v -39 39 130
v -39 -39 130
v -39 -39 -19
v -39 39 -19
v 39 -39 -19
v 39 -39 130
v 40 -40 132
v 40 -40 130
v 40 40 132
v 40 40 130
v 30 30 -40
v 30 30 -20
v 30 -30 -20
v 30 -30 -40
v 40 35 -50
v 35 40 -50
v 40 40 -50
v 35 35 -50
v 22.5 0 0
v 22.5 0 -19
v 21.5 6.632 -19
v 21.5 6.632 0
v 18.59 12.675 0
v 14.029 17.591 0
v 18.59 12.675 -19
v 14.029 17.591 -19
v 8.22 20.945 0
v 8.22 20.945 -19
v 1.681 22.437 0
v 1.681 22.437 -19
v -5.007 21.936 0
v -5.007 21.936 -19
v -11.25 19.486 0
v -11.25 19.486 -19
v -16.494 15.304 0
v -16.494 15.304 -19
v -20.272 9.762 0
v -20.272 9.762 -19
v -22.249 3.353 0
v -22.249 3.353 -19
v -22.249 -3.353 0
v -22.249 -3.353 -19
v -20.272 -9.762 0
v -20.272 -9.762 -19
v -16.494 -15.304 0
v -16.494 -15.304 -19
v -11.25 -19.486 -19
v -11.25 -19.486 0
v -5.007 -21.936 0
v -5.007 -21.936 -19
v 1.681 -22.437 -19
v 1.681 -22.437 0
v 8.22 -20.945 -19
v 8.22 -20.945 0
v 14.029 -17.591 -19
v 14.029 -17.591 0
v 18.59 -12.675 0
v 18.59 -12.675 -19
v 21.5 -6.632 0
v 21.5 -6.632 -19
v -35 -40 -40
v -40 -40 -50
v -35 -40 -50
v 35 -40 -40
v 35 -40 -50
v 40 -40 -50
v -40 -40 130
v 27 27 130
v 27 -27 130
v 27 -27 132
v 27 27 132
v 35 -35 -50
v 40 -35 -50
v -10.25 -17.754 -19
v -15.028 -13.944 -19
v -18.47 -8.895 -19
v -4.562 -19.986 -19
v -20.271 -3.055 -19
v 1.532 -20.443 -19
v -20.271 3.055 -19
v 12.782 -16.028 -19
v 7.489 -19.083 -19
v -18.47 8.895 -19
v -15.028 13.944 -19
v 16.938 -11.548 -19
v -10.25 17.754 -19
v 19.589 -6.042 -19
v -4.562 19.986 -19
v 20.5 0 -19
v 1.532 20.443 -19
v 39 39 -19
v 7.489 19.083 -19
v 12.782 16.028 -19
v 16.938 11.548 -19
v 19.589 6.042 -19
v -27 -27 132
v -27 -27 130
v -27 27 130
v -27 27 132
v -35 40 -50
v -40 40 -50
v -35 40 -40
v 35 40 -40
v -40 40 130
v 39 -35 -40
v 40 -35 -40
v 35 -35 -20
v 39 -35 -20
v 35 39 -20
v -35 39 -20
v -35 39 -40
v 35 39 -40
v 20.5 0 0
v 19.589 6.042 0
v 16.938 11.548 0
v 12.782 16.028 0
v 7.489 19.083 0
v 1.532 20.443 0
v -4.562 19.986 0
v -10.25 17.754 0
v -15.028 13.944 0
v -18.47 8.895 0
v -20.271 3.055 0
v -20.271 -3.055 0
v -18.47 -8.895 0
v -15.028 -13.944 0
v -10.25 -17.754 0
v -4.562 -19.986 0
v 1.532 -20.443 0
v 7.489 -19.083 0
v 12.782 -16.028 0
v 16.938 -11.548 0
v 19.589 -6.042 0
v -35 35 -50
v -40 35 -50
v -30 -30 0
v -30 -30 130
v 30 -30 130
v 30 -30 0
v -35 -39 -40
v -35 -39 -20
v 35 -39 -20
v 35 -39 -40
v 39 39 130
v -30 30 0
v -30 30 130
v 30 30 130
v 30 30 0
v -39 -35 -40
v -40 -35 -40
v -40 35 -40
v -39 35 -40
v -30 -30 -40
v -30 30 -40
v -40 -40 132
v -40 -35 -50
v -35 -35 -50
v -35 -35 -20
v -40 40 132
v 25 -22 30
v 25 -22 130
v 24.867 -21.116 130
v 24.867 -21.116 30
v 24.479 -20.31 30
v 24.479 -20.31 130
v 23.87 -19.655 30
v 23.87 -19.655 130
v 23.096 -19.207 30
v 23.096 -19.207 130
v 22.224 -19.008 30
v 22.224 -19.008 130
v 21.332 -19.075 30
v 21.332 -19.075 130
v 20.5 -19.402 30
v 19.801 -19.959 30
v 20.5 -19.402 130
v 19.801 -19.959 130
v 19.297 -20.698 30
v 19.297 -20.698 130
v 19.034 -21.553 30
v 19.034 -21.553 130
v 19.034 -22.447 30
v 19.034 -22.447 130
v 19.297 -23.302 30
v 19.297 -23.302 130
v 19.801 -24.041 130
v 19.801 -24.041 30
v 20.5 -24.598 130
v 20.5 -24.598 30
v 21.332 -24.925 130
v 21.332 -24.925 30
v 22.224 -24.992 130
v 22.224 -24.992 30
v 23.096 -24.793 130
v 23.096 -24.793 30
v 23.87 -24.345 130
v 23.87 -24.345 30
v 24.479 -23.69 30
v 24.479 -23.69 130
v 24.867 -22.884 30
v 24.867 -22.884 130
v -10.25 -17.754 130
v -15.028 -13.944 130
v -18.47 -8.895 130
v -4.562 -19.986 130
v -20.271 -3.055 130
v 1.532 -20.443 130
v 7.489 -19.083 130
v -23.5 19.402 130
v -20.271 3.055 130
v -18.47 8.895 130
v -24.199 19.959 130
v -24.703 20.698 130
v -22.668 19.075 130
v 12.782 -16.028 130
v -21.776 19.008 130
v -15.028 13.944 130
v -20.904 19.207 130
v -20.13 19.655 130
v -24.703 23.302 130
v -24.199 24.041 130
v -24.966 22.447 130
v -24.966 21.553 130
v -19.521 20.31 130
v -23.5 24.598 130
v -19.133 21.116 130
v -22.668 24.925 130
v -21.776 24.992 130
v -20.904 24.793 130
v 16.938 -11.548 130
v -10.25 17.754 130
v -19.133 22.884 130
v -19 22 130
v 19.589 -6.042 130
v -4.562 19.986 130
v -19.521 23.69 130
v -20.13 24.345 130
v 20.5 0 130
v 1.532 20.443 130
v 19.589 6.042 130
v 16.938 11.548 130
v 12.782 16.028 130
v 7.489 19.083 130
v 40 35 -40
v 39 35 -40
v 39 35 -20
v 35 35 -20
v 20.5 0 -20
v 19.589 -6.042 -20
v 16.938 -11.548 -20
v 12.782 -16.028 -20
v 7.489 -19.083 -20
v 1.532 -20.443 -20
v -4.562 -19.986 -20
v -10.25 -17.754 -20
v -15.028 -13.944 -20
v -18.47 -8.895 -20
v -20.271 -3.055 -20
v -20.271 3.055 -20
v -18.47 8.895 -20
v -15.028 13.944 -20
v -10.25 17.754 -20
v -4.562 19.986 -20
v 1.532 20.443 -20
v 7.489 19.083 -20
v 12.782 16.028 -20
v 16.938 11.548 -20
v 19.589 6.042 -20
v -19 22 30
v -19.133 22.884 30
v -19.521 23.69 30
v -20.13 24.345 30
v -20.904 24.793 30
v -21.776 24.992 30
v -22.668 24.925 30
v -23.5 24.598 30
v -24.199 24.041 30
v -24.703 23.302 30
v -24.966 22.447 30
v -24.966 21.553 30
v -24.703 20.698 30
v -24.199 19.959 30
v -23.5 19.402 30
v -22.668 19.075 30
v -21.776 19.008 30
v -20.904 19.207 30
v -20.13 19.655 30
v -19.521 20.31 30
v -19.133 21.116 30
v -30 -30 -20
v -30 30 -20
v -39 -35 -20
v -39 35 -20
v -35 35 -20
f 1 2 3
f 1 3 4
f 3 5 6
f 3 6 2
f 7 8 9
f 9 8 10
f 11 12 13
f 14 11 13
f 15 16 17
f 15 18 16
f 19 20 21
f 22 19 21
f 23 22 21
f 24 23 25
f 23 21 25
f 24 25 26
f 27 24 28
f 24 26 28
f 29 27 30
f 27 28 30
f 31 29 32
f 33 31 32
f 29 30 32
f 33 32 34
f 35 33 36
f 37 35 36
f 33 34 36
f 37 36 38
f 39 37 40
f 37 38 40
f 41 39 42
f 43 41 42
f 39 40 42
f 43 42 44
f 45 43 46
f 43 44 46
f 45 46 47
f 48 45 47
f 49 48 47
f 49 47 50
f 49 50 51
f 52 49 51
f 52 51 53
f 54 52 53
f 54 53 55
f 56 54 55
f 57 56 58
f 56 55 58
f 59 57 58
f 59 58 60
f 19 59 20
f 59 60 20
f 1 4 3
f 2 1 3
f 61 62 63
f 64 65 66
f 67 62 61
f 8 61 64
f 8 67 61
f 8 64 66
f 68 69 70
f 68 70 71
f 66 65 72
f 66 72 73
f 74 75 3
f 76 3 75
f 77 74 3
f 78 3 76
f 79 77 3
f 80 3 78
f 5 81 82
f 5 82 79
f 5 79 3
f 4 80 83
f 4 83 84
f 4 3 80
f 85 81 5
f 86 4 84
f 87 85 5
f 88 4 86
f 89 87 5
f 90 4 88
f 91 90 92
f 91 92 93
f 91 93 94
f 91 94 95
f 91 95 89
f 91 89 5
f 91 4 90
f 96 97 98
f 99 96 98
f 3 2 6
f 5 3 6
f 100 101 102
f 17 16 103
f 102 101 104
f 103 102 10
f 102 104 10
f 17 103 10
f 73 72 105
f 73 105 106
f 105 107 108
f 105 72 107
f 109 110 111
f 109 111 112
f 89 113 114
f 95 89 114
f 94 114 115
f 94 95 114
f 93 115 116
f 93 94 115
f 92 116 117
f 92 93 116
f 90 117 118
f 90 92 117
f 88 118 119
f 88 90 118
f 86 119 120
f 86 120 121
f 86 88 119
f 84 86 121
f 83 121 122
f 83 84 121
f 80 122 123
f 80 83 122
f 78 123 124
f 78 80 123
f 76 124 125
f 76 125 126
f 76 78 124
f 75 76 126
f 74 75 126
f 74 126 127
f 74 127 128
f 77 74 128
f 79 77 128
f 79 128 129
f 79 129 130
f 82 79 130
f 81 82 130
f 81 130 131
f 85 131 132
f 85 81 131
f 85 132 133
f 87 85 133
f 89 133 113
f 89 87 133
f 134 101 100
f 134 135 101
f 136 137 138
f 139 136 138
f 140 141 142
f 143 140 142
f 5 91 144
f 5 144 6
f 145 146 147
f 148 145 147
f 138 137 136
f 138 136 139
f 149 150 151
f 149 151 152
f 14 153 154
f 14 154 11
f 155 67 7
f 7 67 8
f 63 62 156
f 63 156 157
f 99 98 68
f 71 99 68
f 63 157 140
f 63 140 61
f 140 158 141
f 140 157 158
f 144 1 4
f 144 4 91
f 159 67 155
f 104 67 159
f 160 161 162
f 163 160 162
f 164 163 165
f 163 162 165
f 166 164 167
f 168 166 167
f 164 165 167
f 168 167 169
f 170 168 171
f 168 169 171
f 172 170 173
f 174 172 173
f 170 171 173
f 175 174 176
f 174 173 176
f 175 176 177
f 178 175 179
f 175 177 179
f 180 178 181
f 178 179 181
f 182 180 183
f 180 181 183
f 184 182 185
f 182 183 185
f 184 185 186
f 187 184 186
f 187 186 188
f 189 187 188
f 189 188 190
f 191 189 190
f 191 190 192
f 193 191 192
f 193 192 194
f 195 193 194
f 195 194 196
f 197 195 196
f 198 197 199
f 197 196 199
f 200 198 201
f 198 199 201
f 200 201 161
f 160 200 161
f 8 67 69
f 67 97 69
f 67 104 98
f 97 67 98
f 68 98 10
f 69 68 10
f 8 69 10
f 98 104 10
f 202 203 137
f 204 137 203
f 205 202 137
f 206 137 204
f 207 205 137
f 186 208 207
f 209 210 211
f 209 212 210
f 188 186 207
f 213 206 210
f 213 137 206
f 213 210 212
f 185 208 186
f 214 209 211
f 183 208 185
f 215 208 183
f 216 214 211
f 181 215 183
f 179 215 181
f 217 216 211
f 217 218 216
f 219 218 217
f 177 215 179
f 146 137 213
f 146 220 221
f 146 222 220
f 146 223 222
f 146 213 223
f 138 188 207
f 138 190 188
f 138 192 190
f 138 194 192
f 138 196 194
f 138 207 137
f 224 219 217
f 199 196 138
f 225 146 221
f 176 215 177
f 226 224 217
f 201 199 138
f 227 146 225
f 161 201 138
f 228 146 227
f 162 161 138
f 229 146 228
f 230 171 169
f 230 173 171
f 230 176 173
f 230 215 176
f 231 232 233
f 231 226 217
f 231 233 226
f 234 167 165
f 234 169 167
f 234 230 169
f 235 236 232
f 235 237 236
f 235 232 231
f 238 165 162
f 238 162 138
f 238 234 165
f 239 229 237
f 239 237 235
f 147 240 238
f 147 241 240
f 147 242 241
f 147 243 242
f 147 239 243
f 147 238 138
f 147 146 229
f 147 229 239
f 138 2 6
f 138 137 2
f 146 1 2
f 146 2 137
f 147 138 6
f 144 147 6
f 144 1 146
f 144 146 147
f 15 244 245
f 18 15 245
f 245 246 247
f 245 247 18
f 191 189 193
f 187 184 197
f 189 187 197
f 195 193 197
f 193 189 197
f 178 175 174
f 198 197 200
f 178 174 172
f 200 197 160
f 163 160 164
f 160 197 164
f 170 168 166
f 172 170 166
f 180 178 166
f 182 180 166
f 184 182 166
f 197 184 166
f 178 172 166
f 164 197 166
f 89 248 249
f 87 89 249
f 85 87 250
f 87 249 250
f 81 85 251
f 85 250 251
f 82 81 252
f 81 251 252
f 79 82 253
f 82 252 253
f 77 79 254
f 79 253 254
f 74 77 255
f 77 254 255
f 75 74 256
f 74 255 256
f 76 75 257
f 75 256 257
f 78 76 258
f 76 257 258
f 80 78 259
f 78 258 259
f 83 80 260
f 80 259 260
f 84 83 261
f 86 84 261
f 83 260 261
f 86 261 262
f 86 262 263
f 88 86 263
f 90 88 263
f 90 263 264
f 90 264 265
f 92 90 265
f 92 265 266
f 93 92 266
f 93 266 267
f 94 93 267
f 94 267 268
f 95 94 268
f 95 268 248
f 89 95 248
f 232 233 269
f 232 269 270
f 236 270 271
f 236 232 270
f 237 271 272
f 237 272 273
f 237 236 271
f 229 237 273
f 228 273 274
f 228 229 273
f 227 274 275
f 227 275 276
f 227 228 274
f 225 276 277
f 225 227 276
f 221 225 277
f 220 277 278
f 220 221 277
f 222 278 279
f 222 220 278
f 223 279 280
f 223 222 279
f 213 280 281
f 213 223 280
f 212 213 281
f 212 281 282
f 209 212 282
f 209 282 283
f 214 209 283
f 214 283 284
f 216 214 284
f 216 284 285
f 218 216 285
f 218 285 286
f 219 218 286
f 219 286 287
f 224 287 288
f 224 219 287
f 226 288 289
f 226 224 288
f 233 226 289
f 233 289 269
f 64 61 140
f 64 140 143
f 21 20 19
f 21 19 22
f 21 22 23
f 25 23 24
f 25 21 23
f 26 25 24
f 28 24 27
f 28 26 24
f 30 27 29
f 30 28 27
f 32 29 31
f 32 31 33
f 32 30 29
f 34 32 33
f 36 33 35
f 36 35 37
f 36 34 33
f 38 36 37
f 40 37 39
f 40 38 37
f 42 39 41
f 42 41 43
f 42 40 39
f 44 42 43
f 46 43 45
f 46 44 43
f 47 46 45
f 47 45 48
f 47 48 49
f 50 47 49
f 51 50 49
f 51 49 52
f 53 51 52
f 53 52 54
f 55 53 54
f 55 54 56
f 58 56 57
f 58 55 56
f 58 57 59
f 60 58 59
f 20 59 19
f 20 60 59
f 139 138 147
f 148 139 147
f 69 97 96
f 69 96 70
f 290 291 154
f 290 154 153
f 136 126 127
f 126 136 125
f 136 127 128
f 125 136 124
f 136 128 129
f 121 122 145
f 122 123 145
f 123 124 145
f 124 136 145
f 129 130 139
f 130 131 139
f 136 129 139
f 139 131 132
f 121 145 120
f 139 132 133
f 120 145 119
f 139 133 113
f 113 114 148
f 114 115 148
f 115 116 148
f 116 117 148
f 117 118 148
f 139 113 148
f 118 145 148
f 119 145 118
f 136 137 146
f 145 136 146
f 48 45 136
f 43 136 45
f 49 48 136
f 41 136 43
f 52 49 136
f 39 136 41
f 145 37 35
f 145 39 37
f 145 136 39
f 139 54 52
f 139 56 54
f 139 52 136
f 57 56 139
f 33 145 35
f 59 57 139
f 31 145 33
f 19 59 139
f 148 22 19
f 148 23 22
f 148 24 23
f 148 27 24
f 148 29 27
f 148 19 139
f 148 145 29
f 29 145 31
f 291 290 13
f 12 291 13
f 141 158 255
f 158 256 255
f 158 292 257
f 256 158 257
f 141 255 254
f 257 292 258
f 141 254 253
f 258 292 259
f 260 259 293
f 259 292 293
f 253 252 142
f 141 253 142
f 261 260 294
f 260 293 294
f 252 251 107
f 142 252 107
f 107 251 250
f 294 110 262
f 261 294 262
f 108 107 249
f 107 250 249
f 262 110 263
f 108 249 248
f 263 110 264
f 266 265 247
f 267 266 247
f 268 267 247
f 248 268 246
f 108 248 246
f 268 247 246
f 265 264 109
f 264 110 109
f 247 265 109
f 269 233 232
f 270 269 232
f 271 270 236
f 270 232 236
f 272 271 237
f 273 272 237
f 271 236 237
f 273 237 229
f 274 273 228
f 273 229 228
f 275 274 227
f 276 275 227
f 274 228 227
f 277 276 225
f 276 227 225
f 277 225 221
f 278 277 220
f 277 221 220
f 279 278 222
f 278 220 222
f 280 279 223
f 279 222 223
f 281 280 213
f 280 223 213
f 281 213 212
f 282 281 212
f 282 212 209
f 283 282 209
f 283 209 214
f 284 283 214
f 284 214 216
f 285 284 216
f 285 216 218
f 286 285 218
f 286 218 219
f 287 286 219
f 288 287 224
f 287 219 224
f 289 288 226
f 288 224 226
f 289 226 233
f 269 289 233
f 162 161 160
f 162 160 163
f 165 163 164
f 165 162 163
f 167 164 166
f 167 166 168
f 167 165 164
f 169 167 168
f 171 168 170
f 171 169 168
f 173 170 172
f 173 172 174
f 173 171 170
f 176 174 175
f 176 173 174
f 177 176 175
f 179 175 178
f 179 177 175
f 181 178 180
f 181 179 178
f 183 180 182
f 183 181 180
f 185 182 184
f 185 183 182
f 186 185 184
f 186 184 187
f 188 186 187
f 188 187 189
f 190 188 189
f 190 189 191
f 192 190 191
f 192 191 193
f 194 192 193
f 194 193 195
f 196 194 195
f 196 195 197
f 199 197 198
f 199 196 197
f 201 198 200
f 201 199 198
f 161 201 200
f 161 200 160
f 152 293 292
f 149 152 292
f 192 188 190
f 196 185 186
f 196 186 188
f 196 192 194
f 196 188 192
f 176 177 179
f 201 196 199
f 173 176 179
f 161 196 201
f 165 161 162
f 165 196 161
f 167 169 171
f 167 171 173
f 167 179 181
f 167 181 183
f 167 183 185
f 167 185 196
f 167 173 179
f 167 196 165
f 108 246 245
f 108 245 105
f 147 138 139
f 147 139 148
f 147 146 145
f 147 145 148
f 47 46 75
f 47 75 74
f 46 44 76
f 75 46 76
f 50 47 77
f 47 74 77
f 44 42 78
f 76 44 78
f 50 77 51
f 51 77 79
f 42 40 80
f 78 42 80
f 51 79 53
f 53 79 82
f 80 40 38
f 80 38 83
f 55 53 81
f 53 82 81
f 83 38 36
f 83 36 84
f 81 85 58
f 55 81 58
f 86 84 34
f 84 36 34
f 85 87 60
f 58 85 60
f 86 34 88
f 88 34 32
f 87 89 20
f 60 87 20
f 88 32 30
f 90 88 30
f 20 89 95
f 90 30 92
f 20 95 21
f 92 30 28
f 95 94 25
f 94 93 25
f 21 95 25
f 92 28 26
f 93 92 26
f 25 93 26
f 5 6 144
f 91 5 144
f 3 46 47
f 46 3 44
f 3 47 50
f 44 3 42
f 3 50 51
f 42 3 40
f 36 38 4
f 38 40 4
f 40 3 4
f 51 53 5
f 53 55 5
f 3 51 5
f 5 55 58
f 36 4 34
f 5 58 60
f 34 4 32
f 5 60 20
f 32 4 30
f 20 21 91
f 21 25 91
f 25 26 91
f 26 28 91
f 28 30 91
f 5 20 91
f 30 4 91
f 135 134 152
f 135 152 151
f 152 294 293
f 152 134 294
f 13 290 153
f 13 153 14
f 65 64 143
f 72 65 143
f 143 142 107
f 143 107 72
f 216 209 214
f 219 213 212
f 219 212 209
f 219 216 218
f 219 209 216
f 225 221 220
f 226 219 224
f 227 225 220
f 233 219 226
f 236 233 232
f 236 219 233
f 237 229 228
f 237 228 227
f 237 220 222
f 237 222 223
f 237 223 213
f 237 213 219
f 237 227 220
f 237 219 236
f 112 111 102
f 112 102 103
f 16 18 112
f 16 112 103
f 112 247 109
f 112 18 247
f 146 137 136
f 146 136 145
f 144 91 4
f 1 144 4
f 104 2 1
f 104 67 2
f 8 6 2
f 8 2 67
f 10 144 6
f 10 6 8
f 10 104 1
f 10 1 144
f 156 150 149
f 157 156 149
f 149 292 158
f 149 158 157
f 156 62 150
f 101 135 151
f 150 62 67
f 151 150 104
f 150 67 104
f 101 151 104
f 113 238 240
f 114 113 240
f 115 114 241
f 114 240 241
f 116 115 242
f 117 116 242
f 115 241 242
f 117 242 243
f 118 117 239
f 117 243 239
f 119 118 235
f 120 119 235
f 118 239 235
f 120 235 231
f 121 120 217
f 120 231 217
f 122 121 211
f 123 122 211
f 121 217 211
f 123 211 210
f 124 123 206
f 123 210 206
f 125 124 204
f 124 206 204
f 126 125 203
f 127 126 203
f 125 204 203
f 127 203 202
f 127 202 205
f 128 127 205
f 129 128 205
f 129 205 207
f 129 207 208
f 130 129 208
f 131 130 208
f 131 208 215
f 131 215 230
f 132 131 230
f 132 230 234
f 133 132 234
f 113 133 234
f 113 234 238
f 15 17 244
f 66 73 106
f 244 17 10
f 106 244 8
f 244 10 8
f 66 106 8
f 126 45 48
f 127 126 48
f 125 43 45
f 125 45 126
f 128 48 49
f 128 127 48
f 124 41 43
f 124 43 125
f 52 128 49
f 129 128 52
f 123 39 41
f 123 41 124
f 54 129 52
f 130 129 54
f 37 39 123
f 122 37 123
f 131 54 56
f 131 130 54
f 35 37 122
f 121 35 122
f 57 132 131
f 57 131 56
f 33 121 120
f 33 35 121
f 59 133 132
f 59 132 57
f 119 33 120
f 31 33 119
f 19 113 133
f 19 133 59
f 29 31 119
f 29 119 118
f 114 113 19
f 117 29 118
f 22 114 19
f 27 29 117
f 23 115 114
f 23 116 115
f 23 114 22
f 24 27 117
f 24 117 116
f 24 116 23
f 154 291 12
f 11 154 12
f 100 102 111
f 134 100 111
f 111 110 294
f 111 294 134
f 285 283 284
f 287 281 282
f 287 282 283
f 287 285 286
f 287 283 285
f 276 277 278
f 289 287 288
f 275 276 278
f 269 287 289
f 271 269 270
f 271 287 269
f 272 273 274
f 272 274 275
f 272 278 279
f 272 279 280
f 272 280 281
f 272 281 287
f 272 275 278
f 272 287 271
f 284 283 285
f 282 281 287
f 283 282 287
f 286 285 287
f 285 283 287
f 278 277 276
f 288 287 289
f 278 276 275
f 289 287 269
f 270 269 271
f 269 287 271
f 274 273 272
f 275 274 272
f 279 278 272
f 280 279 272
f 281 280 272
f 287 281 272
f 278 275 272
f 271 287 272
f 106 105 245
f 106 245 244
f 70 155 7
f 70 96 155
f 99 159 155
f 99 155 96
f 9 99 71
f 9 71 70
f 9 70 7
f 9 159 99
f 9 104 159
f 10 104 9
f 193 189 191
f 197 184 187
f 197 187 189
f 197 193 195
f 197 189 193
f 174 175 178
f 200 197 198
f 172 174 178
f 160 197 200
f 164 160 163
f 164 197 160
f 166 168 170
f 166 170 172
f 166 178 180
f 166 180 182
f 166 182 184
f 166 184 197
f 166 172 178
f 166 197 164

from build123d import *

# Parameters (mm, degrees)
F0_W          = 60
F0_H          = 60
F1_DEPTH      = 130
F2_R          = 20.5
F3_DEPTH      = 150
F4_R          = 3
F5_DEPTH      = 100
F6_DEPTH      = 100
F7_W          = 80
F7_H          = 80
F8_DEPTH      = 130
F8_DEPTH_BACK = 20
F9_T          = -1
F10_R         = 20.5
F11_DEPTH     = 25
F12_R         = 22.5
F12_R_2       = 20.5
F13_DEPTH     = 19
F14_W         = 60
F14_H         = 60
F14_R         = 20.5
F15_DEPTH     = 20
F17_DEPTH     = 30
F16_W         = 1
F16_H         = 70
F16_W_2       = 70
F16_H_2       = 1
F18_DEPTH     = 20
F19_DEPTH     = 149
F8_FACE1_W    = 80
F8_FACE1_H    = 80
F8_FACE1_W_2  = 78
F8_FACE1_H_2  = 78
F21_W         = 60
F21_H         = 60
F21_W_2       = 54
F21_H_2       = 54
F22_DEPTH     = 2


with BuildPart() as f1:
    # F0 (on Top) → F1 (new body)
    with BuildSketch(Plane.XY):
        Rectangle(F0_W, F0_H)
    extrude(amount=F1_DEPTH)

    # F2 (on face) → F3 (cut)
    with BuildSketch(Plane.XY.offset(130)):
        Circle(F2_R)
    extrude(amount=-F3_DEPTH, mode=Mode.SUBTRACT)

    # F4 (on face) → F5 (cut)
    with BuildSketch(Plane.XY.offset(130)):
        with Locations((-22, 22)):
            Circle(F4_R)
        with Locations((22, -22)):
            Circle(F4_R)
    extrude(amount=-F5_DEPTH, mode=Mode.SUBTRACT)


with BuildPart() as f6:
    # F4 (on face) → F6 (new body)
    with BuildSketch(Plane.XY.offset(130)):
        with Locations((22, -22)):
            Circle(F4_R)
    extrude(amount=-F6_DEPTH)


with BuildPart() as f6b:
    # F4 (on face) → F6, piece 2 (new body)
    with BuildSketch(Plane.XY.offset(130)):
        with Locations((-22, 22)):
            Circle(F4_R)
    extrude(amount=-F6_DEPTH)


with BuildPart() as f8:
    # F7 (on Top) → F8 (new body, two sides)
    with BuildSketch(Plane.XY) as f8_sk:
        Rectangle(F7_W, F7_H)
    extrude(amount=F8_DEPTH)
    extrude(f8_sk.sketch, amount=-F8_DEPTH_BACK)

    # F9
    f9_openings = [f8.faces().sort_by_distance(p)[0] for p in [
        (0, 0, 130),
    ]]
    offset(amount=F9_T, openings=f9_openings)

    # F10 (on face) → F11 (cut)
    with BuildSketch(Plane(origin=(0, 0, -20), x_dir=(1, 0, 0), z_dir=(0, 0, -1))):
        Circle(F10_R)
    extrude(amount=-F11_DEPTH, mode=Mode.SUBTRACT)

    # F16 (on face) → F17 (join)
    with BuildSketch(Plane(origin=(0, 0, -20), x_dir=(1, 0, 0), z_dir=(0, 0, -1))):
        Polygon((35, -40), (40, -40), (40, -35), (39, -35), (37.5, -35), (35, -35), (35, -39), align=None)
        Polygon((-40, -40), (-35, -40), (-35, -39), (-35, -35), (-39, -35), (-40, -35), align=None)
        Polygon((-40, 40), (-40, 35), (-39, 35), (-35, 35), (-35, 39), (-35, 40), align=None)
        Polygon((39, 35), (40, 35), (40, 40), (35, 40), (35, 39), (35, 35), (37.5, 35), align=None)
    extrude(amount=F17_DEPTH)

    # F16 (on face) → F18 (join)
    with BuildSketch(Plane(origin=(0, 0, -20), x_dir=(1, 0, 0), z_dir=(0, 0, -1))):
        with Locations((39.5, 0)):
            Rectangle(F16_W, F16_H)
        with Locations((0, -39.5)):
            Rectangle(F16_W_2, F16_H_2)
        with Locations((-39.5, 0)):
            Rectangle(F16_W, F16_H)
        with Locations((0, 39.5)):
            Rectangle(F16_W_2, F16_H_2)
    extrude(amount=F18_DEPTH)


with BuildPart() as f13:
    # F12 (on face) → F13 (new body)
    with BuildSketch(Plane.XY.offset(-19)):
        Circle(F12_R)
        Circle(F12_R_2, mode=Mode.SUBTRACT)
    extrude(amount=F13_DEPTH)


with BuildPart() as f15:
    # F14 (on face) → F15 (new body)
    with BuildSketch(Plane(origin=(0, 0, -20), x_dir=(1, 0, 0), z_dir=(0, 0, -1))):
        Rectangle(F14_W, F14_H)
        Circle(F14_R, mode=Mode.SUBTRACT)
        Circle(F14_R)
    extrude(amount=F15_DEPTH)


with BuildPart() as f19:
    # F19 (new): a face of the model
    f19_faces = [f8.part.faces().sort_by_distance(p)[0] for p in [
        (37.8969134213, 0, -19),
    ]]
    extrude(f19_faces, amount=F19_DEPTH)

    # F20: cut F15, F13, F6b, F8, F6, F1
    add(f15.part, mode=Mode.SUBTRACT)
    add(f13.part, mode=Mode.SUBTRACT)
    add(f6b.part, mode=Mode.SUBTRACT)
    add(f8.part, mode=Mode.SUBTRACT)
    add(f6.part, mode=Mode.SUBTRACT)
    add(f1.part, mode=Mode.SUBTRACT)


with BuildPart() as f22:
    # F8_face1 (on face) + F21 (on face) → F22 (new body)
    with BuildSketch(Plane.XY.offset(130)):
        Rectangle(F8_FACE1_W, F8_FACE1_H)
        Rectangle(F8_FACE1_W_2, F8_FACE1_H_2, mode=Mode.SUBTRACT)
    with BuildSketch(Plane.XY.offset(130)):
        Polygon((-39, -39), (39, -39), (39, 39), (-39, 39), (-39, -38.8472890854), align=None)
        Rectangle(F21_W, F21_H, mode=Mode.SUBTRACT)
        Rectangle(F21_W, F21_H)
        Rectangle(F21_W_2, F21_H_2, mode=Mode.SUBTRACT)
    extrude(amount=F22_DEPTH)


solid = Compound([f1.part, f6.part, f6b.part, f8.part, f13.part, f15.part, f19.part, f22.part])
